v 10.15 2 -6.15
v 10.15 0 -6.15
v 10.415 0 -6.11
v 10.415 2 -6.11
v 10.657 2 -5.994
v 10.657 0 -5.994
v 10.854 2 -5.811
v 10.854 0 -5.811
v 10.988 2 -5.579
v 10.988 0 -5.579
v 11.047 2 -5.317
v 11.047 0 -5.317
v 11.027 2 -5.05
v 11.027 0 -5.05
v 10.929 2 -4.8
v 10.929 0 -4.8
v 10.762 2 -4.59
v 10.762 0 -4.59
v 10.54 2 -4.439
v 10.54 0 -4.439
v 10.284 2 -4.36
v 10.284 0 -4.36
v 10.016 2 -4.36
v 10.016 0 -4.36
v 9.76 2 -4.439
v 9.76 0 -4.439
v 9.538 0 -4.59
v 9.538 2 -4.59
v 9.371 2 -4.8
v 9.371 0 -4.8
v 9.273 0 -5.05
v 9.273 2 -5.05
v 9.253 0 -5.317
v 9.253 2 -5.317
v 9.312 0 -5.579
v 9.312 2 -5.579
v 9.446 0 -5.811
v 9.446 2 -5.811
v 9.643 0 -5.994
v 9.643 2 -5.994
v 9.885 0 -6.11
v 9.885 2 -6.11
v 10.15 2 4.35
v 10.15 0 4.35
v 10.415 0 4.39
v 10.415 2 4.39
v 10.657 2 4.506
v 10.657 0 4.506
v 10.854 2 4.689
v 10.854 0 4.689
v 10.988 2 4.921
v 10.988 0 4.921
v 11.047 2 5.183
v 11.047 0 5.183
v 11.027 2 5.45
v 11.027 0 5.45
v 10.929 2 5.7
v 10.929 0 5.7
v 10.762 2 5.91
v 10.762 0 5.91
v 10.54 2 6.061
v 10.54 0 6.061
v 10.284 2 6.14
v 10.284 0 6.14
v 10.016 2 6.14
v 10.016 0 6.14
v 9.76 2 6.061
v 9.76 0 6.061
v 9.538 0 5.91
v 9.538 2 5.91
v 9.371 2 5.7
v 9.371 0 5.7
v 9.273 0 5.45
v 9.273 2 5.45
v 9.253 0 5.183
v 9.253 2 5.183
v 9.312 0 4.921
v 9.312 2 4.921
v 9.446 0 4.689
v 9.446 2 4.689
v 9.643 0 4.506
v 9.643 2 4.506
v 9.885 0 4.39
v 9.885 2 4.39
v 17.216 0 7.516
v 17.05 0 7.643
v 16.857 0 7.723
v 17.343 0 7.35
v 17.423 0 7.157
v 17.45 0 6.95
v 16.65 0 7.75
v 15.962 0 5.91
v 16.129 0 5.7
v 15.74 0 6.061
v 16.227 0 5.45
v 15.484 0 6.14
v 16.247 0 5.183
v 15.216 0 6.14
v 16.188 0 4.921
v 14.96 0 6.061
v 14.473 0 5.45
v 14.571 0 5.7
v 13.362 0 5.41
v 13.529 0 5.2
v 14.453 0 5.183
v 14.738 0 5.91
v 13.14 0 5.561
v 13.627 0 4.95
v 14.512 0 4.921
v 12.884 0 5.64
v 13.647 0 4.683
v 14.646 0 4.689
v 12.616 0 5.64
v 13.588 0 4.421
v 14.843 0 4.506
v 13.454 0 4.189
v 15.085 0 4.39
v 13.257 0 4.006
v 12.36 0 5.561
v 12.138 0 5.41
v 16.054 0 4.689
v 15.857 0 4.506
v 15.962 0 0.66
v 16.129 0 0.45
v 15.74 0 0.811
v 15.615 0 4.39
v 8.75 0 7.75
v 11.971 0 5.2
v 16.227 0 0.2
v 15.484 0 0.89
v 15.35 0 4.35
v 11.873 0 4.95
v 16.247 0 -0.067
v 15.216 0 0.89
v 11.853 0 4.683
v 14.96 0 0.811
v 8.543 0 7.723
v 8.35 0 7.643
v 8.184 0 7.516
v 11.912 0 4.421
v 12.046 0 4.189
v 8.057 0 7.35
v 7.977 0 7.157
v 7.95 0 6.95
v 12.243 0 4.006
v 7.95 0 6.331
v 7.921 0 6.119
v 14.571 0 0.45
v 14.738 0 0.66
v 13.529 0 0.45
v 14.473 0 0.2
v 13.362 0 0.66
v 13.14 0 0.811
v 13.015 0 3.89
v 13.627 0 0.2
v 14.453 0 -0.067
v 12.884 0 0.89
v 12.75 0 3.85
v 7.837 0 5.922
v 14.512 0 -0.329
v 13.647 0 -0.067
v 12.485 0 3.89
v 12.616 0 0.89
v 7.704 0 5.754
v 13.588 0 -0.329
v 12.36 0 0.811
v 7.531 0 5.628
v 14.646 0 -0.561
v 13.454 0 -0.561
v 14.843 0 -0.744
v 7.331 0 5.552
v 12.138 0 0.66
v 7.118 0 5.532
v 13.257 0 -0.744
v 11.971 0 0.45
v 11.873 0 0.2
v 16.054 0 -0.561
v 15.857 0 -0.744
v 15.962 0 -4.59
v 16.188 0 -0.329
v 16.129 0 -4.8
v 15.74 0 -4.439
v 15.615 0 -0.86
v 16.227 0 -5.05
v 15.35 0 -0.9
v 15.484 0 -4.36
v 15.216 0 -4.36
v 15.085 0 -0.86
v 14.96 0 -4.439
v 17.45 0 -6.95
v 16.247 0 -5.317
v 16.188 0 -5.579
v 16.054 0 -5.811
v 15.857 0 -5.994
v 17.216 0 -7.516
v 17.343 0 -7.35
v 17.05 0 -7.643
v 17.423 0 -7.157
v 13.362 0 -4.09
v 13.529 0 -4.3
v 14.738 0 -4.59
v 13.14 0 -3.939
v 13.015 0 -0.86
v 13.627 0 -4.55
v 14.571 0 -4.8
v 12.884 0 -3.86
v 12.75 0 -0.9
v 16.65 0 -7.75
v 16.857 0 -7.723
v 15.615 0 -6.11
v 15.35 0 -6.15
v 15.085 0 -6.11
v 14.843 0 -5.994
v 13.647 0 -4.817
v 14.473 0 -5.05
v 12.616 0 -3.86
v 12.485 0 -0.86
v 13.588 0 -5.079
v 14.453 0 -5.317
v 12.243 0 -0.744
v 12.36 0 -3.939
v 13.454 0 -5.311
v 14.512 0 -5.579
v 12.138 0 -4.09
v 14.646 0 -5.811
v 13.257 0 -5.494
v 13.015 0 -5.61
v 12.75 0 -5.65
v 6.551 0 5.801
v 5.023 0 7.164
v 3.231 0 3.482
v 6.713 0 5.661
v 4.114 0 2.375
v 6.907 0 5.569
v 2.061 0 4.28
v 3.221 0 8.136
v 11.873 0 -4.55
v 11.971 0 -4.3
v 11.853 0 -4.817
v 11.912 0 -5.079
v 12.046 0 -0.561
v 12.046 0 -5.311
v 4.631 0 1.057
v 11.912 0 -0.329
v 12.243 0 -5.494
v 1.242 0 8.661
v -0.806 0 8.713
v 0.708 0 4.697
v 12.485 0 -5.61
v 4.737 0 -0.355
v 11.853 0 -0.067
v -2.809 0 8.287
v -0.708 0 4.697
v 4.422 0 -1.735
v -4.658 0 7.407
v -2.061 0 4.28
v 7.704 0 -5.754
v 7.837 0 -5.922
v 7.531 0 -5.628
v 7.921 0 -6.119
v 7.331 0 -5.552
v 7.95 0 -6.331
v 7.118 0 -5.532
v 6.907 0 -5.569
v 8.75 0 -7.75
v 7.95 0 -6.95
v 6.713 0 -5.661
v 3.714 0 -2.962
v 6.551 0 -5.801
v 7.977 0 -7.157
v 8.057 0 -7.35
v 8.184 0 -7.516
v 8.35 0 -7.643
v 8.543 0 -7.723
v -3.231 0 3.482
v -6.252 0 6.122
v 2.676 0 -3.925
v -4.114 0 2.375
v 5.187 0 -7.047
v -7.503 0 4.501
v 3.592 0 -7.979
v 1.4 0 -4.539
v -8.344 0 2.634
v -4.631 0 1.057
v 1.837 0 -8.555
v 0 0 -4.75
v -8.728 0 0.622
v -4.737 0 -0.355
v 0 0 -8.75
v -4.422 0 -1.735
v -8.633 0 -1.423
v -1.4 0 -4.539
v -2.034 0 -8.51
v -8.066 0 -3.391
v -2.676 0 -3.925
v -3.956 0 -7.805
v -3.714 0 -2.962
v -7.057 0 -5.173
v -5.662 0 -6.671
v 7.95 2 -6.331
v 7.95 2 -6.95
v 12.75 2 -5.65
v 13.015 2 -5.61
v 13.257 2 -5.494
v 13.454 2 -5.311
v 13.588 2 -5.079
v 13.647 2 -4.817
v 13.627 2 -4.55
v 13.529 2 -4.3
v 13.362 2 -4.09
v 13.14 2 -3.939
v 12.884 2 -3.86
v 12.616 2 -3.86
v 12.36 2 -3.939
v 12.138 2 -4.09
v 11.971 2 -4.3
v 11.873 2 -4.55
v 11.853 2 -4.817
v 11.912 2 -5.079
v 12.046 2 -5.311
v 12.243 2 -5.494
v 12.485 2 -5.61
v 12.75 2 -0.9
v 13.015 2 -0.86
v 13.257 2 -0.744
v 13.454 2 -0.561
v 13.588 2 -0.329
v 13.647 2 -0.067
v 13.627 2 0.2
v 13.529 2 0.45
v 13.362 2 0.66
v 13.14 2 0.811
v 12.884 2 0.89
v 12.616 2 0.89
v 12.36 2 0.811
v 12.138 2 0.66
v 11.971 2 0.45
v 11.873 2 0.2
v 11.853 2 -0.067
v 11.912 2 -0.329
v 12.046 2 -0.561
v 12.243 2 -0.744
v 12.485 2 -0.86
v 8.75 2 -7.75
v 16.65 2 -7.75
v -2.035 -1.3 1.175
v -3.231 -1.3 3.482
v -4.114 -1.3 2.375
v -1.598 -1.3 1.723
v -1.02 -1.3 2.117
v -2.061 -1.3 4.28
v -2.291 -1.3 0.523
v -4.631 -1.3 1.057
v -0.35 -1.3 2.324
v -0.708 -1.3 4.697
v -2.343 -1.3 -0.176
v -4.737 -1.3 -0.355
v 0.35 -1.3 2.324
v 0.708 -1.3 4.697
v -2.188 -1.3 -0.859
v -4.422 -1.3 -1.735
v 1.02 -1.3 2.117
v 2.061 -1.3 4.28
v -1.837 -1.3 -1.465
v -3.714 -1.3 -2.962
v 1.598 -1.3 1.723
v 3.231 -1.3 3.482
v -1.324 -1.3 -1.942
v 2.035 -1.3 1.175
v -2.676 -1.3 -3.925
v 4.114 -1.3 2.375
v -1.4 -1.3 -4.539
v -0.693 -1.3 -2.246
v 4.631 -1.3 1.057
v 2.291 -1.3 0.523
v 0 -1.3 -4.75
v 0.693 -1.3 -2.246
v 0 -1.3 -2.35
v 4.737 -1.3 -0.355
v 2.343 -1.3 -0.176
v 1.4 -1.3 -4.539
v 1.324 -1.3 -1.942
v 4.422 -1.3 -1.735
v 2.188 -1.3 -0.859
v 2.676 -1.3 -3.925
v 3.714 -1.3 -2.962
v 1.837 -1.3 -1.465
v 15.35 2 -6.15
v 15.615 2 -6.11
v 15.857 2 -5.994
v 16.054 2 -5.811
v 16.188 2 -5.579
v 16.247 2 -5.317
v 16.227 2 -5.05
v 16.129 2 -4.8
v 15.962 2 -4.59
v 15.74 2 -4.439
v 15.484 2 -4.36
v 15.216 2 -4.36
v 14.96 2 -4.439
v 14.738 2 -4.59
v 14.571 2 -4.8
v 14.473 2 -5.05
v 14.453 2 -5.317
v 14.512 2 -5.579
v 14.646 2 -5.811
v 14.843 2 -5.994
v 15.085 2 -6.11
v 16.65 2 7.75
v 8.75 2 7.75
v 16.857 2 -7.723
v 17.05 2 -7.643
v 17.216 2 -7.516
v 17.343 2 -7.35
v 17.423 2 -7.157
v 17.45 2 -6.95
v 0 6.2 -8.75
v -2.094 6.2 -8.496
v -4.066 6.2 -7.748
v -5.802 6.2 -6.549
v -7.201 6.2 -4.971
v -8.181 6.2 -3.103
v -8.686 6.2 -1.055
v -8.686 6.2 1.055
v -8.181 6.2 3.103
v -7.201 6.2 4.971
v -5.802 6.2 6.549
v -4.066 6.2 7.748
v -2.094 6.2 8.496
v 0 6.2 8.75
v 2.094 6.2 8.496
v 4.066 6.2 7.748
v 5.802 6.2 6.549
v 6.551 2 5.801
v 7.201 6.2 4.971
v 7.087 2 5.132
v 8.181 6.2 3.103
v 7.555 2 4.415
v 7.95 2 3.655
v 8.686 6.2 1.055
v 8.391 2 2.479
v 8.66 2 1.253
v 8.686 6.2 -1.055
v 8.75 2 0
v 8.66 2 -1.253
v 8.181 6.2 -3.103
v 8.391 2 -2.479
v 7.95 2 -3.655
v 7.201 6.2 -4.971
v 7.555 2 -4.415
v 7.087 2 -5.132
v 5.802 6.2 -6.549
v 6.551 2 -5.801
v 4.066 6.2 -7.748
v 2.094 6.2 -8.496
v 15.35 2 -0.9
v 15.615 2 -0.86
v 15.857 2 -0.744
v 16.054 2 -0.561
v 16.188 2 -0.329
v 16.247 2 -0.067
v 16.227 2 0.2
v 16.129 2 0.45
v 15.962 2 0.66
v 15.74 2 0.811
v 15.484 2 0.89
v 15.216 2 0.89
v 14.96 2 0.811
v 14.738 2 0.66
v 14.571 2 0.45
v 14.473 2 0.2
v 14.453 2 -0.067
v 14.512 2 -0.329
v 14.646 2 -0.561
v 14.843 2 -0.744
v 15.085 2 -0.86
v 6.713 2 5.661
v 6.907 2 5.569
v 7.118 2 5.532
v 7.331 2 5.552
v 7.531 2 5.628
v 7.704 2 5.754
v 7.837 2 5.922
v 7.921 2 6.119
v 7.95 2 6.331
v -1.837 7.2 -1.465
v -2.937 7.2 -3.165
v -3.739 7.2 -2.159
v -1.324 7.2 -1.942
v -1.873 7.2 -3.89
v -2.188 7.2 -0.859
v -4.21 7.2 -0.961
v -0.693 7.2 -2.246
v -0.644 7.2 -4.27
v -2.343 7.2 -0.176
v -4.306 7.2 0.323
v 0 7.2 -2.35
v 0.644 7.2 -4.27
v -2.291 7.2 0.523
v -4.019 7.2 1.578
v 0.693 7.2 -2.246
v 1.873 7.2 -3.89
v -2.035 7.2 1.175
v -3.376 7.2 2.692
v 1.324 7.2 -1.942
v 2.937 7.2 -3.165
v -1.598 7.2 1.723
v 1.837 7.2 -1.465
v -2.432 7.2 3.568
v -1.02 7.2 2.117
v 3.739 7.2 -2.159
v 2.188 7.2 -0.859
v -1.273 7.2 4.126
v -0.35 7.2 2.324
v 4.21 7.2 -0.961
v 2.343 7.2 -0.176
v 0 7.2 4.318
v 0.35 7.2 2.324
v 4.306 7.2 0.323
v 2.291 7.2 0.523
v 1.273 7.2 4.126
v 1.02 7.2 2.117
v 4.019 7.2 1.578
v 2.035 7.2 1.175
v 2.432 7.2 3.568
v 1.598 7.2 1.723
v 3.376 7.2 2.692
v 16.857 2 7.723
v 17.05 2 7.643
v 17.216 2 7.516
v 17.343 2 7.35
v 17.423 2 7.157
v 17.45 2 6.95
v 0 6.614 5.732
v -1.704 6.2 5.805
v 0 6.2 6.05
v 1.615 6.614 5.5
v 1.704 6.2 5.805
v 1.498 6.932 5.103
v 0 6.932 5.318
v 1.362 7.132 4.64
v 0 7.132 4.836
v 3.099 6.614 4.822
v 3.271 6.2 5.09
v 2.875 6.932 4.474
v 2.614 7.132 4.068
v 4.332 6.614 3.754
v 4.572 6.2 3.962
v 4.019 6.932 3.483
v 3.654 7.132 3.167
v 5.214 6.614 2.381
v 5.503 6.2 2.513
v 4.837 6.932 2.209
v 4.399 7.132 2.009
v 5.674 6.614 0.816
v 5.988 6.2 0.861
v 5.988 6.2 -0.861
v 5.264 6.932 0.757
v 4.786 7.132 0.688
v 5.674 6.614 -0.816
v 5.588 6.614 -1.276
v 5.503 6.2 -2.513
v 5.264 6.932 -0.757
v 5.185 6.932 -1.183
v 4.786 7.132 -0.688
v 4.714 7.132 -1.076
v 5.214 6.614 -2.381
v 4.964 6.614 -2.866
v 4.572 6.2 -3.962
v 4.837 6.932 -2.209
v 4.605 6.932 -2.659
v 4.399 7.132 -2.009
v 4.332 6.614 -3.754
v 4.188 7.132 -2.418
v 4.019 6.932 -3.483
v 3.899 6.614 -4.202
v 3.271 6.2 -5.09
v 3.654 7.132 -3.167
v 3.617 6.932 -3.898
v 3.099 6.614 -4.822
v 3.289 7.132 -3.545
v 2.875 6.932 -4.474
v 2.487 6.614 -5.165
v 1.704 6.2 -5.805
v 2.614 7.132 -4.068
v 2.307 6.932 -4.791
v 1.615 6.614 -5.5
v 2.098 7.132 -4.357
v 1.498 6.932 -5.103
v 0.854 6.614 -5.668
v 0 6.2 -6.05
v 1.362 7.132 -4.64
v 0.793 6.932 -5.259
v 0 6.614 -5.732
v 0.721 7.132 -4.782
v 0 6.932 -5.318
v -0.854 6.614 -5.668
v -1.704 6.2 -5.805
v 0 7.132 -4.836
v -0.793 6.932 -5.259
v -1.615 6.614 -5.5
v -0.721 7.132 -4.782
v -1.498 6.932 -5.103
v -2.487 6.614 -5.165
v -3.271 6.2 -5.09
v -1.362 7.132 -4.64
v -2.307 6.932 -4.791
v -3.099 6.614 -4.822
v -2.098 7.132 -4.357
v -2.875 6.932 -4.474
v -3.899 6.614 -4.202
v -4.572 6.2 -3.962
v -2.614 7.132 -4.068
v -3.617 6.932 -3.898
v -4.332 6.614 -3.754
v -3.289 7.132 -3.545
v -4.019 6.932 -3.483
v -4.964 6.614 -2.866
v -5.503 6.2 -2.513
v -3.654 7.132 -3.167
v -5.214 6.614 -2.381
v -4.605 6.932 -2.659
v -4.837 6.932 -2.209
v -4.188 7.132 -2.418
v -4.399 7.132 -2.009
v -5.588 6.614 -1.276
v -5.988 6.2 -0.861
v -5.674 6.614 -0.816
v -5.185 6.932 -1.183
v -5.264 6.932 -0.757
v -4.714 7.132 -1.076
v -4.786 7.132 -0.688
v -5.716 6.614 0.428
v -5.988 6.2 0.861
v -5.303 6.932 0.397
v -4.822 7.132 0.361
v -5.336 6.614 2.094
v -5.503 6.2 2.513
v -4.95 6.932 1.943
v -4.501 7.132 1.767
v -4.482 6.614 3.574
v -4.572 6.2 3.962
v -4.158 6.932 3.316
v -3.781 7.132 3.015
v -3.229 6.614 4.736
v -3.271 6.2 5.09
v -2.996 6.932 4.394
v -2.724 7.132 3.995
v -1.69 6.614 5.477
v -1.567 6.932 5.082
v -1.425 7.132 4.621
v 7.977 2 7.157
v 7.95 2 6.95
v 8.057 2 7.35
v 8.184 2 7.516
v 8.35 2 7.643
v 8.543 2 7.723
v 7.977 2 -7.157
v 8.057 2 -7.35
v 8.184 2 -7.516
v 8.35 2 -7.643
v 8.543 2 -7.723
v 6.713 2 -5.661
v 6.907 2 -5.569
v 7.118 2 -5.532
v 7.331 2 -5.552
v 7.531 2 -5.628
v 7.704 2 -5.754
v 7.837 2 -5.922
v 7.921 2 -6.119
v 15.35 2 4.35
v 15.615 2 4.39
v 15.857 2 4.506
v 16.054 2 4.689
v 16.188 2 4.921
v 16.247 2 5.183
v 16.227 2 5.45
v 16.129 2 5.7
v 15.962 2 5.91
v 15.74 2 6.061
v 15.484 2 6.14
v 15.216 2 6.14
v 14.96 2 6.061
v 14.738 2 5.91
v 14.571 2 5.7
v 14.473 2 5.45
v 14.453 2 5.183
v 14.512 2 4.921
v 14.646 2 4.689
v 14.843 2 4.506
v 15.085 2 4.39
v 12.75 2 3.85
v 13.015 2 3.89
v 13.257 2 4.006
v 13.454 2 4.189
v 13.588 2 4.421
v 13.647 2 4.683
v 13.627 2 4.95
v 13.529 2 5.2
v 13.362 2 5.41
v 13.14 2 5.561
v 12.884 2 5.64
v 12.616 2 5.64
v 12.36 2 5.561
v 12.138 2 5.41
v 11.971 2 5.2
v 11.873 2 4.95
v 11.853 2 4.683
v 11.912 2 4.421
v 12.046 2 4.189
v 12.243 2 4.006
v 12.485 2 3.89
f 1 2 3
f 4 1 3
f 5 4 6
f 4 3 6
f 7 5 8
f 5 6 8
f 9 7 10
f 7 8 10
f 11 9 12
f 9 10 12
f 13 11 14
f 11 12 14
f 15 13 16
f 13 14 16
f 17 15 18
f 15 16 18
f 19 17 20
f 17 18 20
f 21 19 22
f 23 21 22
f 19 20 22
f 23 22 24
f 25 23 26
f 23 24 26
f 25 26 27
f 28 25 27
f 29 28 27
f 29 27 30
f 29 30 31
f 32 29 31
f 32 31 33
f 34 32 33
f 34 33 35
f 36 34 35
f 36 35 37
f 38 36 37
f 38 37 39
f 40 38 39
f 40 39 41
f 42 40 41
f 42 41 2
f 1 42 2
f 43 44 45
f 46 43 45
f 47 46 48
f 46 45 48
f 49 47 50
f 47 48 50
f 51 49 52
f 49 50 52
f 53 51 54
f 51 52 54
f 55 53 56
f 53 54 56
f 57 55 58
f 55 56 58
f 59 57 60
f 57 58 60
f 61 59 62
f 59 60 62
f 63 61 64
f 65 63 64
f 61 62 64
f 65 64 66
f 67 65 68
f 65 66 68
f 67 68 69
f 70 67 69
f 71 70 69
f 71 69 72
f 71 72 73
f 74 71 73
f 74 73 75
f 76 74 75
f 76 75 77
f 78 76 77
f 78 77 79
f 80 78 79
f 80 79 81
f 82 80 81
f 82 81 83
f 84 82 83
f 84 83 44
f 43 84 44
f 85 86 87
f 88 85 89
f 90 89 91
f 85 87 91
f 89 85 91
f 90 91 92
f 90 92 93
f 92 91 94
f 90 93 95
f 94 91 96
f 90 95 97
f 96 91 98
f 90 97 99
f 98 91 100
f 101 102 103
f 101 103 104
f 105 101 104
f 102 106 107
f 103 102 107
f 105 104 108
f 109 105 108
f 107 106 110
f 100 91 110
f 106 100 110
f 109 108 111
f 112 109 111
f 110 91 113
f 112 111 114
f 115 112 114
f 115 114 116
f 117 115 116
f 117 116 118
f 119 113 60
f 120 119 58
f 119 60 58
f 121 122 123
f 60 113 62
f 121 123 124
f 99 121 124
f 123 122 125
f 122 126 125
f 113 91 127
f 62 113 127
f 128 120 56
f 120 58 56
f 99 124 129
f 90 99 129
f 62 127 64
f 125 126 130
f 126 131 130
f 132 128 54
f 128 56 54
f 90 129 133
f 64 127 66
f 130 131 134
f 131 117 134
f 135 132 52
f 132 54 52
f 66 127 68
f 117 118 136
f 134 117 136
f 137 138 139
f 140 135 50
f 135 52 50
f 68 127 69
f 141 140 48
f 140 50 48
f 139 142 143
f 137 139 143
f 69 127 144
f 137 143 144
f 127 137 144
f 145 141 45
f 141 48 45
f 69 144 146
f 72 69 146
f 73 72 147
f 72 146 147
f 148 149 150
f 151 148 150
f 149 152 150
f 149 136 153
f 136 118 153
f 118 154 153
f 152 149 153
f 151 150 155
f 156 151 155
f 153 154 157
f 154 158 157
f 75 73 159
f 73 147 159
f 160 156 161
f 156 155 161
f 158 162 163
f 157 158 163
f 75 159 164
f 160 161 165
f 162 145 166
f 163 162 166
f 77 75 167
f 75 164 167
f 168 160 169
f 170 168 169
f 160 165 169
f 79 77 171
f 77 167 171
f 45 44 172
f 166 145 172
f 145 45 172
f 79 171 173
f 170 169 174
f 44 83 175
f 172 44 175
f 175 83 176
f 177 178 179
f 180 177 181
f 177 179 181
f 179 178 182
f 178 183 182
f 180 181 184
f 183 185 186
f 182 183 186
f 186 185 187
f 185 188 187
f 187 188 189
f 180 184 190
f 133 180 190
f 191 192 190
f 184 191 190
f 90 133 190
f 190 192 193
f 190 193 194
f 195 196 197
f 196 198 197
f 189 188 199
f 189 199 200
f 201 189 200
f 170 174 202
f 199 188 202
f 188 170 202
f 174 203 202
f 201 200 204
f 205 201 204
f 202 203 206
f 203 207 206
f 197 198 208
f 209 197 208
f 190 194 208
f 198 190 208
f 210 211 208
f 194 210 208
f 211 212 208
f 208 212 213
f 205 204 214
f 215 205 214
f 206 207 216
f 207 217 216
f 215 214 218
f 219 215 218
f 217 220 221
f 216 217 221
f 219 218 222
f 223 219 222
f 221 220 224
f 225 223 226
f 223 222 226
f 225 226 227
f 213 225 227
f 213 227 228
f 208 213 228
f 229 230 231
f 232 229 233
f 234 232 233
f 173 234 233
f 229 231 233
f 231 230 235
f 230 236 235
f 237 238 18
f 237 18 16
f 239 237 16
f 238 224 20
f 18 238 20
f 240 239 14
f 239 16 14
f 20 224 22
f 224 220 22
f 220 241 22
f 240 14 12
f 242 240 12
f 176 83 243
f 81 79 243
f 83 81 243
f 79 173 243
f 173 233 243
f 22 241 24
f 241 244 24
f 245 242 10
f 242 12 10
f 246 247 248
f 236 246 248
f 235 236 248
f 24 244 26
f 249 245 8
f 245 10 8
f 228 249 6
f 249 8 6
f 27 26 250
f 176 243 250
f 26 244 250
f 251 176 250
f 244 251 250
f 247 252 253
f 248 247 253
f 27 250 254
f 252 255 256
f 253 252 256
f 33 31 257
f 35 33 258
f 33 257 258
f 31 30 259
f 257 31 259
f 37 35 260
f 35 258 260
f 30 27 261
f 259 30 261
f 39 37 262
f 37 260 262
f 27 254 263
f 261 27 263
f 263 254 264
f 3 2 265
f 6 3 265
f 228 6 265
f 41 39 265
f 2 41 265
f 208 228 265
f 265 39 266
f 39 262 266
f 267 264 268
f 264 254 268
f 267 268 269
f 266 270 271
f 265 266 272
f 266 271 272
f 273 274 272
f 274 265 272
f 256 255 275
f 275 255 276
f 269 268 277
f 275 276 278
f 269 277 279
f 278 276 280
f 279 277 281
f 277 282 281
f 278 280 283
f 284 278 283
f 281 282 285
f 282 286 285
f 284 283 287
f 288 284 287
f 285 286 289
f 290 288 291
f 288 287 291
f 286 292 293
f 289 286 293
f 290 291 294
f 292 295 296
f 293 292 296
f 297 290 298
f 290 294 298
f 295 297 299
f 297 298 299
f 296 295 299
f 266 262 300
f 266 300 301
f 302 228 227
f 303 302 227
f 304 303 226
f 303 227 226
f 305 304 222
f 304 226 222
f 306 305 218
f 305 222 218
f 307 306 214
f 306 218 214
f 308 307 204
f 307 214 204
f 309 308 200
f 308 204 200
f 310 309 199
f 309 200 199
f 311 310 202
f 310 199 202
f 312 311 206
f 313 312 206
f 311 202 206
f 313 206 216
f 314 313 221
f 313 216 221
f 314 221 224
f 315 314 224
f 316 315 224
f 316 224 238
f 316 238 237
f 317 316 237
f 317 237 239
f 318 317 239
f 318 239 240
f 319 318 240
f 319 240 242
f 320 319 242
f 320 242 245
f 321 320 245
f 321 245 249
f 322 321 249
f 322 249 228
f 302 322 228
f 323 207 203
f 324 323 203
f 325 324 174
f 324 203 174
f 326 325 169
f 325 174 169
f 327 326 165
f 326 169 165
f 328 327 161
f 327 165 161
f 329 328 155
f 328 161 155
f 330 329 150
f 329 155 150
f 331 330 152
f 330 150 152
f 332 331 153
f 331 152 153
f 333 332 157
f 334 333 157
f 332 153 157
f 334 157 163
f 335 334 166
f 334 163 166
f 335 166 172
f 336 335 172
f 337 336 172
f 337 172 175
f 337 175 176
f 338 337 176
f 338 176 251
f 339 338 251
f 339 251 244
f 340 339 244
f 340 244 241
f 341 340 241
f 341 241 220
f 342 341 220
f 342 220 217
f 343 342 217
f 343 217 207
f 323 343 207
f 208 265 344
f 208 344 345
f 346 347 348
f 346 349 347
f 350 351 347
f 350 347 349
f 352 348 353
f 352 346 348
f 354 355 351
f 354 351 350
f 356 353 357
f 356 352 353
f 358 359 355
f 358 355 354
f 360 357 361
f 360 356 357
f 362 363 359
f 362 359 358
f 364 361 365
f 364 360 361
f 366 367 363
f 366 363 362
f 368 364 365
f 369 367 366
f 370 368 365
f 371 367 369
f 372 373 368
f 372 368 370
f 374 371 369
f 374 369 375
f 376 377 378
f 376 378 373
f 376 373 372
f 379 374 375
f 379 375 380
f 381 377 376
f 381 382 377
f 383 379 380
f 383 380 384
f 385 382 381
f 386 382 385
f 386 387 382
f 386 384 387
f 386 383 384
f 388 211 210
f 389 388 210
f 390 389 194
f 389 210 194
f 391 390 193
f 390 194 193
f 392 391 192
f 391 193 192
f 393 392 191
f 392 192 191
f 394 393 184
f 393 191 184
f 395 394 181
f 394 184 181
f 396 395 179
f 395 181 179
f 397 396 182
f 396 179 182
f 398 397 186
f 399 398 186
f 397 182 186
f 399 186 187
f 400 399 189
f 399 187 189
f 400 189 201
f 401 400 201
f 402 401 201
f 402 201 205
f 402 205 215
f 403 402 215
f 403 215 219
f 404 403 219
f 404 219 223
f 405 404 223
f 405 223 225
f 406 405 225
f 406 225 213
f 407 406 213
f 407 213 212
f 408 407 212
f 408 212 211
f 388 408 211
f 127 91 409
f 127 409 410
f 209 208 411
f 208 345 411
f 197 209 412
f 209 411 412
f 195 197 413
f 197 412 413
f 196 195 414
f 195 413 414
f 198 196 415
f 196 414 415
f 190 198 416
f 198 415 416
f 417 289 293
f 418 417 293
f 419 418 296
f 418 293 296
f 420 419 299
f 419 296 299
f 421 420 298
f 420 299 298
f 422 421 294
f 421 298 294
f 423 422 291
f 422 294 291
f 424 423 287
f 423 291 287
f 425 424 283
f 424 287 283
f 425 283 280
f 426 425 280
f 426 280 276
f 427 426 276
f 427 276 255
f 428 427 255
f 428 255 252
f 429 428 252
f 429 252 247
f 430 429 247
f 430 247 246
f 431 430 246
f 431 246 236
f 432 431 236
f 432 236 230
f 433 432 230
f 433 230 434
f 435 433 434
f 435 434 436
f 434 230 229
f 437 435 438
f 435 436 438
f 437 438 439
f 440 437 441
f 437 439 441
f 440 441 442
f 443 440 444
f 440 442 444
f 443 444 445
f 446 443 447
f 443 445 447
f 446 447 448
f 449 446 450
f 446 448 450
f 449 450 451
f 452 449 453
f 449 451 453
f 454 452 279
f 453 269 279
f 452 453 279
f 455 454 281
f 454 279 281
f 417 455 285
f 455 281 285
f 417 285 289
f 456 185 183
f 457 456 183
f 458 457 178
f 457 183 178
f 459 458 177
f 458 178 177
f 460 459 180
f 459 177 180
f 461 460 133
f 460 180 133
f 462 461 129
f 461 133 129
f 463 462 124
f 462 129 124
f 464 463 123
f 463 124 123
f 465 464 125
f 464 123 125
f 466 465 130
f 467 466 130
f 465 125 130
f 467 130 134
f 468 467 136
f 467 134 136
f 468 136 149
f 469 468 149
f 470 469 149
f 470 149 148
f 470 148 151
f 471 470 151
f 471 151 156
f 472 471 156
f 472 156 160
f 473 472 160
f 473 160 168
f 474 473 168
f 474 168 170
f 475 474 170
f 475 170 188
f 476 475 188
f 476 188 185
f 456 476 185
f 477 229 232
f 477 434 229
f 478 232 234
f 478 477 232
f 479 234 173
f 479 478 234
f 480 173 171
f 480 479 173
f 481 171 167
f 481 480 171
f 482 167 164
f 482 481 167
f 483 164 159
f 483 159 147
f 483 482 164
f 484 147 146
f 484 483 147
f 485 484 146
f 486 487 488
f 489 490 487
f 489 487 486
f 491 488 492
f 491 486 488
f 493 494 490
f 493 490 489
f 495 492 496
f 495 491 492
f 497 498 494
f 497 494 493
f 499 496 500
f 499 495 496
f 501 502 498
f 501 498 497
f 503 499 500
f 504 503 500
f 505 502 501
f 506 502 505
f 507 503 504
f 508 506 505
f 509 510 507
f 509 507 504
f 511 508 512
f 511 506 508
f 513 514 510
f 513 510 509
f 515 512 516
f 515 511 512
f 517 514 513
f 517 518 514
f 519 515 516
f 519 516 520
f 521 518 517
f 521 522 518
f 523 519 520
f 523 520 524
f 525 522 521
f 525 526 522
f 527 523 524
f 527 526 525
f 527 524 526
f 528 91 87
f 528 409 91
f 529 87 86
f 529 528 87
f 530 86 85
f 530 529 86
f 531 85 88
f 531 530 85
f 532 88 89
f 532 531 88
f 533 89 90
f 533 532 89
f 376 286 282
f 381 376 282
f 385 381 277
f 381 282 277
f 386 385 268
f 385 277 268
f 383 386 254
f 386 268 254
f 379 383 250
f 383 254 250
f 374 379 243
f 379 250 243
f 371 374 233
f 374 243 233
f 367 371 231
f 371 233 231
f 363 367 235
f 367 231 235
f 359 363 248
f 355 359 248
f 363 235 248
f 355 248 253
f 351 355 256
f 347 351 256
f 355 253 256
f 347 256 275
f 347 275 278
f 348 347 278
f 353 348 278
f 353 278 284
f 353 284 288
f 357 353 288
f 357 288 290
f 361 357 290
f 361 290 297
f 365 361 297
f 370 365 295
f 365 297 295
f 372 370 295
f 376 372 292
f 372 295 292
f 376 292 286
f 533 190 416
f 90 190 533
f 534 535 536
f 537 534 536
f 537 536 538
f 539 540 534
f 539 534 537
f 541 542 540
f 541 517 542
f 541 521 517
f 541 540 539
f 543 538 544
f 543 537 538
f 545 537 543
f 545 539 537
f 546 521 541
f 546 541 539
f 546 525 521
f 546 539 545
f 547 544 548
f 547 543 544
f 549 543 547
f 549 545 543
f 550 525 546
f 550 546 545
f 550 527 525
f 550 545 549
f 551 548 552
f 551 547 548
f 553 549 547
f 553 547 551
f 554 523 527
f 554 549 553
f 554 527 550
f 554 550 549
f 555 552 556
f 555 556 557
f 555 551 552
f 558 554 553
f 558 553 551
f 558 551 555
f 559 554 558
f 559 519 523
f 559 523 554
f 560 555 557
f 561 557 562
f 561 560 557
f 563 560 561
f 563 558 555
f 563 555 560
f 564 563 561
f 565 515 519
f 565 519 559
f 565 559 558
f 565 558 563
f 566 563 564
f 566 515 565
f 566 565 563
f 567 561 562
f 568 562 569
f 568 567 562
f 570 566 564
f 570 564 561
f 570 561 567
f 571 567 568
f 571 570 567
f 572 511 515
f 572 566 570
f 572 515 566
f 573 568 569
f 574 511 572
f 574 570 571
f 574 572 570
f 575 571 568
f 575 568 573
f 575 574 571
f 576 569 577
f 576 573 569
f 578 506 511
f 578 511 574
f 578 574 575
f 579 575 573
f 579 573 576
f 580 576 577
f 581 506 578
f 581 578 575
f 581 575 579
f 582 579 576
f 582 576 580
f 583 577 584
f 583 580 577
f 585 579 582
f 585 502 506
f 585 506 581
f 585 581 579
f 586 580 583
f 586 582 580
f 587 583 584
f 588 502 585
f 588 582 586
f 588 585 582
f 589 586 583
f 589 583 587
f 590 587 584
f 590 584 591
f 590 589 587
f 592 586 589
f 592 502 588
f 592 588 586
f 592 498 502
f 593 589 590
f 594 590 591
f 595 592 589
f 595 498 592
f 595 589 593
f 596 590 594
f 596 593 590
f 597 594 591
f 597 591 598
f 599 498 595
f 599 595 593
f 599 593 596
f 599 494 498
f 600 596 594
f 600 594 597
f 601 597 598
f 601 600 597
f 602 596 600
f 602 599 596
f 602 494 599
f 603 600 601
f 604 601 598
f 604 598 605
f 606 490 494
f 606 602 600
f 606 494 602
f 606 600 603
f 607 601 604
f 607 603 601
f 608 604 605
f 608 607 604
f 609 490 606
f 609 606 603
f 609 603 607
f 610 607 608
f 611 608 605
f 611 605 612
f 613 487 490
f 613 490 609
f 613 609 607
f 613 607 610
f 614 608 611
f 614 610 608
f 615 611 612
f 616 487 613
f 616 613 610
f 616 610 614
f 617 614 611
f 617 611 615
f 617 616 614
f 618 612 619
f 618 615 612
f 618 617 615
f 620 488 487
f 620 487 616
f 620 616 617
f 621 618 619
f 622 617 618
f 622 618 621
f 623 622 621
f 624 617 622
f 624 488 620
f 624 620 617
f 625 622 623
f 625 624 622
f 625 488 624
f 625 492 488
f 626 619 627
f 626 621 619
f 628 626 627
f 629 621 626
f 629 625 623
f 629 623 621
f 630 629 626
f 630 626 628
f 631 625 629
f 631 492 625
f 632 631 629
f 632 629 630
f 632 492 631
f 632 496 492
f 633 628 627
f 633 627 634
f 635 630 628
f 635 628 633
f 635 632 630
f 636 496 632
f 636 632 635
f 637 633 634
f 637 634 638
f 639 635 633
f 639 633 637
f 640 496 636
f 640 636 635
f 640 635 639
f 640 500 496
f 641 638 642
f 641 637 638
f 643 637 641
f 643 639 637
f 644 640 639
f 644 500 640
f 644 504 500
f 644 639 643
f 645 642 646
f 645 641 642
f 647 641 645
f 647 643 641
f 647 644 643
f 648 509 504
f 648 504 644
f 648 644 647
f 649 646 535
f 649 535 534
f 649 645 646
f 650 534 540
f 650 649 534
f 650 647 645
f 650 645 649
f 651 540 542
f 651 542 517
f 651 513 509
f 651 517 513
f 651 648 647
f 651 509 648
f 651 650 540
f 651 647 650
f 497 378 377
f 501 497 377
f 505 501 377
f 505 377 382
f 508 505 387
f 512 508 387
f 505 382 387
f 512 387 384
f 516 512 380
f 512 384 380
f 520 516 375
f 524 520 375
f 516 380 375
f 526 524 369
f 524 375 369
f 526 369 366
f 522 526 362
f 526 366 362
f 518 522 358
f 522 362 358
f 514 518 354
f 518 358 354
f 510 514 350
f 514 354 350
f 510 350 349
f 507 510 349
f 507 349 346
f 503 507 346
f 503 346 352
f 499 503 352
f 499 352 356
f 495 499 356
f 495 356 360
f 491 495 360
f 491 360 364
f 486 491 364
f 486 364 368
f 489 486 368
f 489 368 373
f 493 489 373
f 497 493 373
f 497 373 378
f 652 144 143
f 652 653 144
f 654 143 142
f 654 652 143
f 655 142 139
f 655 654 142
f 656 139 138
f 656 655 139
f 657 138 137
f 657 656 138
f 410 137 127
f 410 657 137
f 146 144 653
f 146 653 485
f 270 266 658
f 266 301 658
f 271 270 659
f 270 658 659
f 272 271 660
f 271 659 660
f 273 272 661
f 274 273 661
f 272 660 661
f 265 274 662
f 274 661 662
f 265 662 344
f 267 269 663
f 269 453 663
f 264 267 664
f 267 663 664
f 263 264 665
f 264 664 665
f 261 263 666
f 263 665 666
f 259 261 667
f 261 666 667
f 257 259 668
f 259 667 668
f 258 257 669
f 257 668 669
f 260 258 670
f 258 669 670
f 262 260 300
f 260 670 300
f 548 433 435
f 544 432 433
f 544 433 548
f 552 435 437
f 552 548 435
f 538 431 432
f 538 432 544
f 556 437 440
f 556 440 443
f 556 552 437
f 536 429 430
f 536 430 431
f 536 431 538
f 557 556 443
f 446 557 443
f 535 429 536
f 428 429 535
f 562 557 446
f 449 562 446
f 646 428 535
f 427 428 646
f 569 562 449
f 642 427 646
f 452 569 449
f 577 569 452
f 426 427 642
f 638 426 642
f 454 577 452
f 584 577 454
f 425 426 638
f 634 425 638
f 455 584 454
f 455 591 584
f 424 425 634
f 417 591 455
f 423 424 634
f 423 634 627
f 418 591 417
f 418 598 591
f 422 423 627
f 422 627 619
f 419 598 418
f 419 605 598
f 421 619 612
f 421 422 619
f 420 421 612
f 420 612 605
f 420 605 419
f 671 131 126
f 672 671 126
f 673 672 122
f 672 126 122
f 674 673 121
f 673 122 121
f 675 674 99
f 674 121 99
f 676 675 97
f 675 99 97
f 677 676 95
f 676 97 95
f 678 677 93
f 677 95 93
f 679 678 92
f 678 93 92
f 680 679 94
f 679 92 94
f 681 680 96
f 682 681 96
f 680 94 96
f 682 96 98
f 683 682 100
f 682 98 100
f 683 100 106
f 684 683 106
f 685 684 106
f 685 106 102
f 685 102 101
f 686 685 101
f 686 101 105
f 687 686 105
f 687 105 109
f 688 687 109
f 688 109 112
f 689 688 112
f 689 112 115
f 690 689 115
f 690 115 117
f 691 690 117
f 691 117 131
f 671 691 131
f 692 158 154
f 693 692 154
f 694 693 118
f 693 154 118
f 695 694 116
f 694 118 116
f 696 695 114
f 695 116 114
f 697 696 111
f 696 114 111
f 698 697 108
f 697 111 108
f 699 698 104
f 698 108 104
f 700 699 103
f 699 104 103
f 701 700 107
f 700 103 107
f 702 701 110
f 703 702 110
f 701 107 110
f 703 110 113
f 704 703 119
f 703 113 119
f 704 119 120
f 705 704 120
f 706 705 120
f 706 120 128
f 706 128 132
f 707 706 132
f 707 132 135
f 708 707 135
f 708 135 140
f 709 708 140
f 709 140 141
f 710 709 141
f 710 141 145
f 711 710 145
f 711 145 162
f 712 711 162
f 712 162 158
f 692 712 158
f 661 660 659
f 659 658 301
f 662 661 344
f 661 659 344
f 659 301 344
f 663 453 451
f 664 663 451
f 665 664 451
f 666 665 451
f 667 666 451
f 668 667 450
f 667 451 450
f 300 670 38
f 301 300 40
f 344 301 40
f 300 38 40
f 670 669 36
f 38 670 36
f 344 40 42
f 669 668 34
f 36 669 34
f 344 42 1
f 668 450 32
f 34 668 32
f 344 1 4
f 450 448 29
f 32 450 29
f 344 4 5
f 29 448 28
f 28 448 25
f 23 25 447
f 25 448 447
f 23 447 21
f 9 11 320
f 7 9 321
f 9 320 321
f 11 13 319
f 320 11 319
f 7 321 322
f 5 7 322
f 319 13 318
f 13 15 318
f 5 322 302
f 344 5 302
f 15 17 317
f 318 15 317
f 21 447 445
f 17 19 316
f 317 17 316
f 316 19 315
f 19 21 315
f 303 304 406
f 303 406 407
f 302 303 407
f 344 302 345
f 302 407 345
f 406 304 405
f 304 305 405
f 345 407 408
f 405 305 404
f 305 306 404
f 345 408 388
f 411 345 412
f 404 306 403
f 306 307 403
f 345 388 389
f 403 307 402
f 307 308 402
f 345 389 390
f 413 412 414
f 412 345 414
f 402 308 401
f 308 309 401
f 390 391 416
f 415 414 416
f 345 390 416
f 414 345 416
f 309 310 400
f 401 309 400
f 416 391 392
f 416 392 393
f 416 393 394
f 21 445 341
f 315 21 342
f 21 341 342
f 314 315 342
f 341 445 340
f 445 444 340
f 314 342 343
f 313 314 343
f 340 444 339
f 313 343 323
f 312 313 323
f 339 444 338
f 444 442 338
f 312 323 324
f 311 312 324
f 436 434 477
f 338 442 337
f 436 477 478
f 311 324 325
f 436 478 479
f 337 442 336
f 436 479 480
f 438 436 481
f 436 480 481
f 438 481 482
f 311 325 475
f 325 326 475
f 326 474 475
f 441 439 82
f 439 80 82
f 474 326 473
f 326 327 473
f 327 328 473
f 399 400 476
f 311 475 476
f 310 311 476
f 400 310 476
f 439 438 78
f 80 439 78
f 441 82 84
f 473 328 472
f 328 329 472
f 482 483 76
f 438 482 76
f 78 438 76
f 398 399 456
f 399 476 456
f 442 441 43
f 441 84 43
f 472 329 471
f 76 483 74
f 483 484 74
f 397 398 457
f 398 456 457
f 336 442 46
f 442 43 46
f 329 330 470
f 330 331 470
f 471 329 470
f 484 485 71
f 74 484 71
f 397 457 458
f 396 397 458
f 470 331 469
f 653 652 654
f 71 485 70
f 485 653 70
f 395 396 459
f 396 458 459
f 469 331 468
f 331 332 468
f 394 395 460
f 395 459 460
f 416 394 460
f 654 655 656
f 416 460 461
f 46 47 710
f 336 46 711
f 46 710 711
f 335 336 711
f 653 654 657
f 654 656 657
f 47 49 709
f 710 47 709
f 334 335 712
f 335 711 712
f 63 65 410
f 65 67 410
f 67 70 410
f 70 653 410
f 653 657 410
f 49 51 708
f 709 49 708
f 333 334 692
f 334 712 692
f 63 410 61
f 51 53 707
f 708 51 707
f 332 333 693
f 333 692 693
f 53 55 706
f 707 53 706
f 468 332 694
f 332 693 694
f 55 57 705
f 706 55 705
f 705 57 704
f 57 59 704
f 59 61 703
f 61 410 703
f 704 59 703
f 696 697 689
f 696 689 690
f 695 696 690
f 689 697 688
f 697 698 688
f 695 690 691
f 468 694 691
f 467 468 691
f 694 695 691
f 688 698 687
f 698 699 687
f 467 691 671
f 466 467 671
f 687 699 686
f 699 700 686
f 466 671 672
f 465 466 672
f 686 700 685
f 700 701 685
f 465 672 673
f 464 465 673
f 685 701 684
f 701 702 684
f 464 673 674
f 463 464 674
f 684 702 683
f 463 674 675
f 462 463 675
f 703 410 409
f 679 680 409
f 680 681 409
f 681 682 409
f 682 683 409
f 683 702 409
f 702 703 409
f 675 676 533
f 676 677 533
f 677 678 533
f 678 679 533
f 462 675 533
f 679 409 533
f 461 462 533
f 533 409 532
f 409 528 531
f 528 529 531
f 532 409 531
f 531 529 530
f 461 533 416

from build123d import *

# Parameters (mm, degrees)
SKETCH1_R           = 8.75
BOSS_EXTRUDE1_DEPTH = 6.2
BOSS_EXTRUDE2_DEPTH = 2
FILLET1_R           = 0.8
SKETCH3_R           = 4.75
BOSS_EXTRUDE3_DEPTH = 1.3
SKETCH6_R           = 6.05
BOSS_EXTRUDE5_DEPTH = 1
SKETCH4_R           = 2.35
CUT_EXTRUDE2_DEPTH  = 22.291195363
FILLET2_R           = 2
SKETCH7_R           = 0.9
CUT_EXTRUDE4_DEPTH  = 10


with BuildPart() as part:
    # Sketch1 → Boss-Extrude1 (new body)
    with BuildSketch(Plane(origin=(0, 0, 0), x_dir=(1, 0, 0), z_dir=(0, 1, 0))):
        with Locations(Location((0, 0, 0), (0, 0, 90))):
            Circle(SKETCH1_R)
    extrude(amount=BOSS_EXTRUDE1_DEPTH)

    # Sketch2 → Boss-Extrude2 (add)
    with BuildSketch(Plane.XZ):
        with BuildLine():
            ThreePointArc((7.95, 3.655133376), (8.547660499, 1.870828693), (8.75, 0))
            Line((8.75, 0), (17.45, 0))
            Line((17.45, 0), (17.45, 7.75))
            Line((17.45, 7.75), (7.95, 7.75))
            Line((7.95, 7.75), (7.95, 3.655133376))
        make_face()
        with BuildLine():
            Line((17.45, 0), (8.75, 0))
            ThreePointArc((8.75, 0), (8.547660499, -1.870828693), (7.95, -3.655133376))
            Line((7.95, -3.655133376), (7.95, -7.75))
            Line((7.95, -7.75), (17.45, -7.75))
            Line((17.45, -7.75), (17.45, 0))
        make_face()
    extrude(amount=-BOSS_EXTRUDE2_DEPTH)

    # Fillet1
    fillet1_edges = [part.edges().sort_by_distance(p)[0] for p in [
        (7.95, 1, 3.655133376),
        (7.95, 1, 7.75),
        (17.45, 1, 7.75),
        (17.45, 1, -7.75),
        (7.95, 1, -7.75),
        (7.95, 1, -3.655133376),
    ]]
    fillet(fillet1_edges, radius=FILLET1_R)

    # Sketch3 → Boss-Extrude3 (add)
    with BuildSketch(Plane.XZ):
        with Locations(Location((0, 0, 0), (0, 0, 270))):
            Circle(SKETCH3_R)
    extrude(amount=BOSS_EXTRUDE3_DEPTH)

    # Sketch6 → Boss-Extrude5 (add)
    with BuildSketch(Plane(origin=(0, 6.2, 0), x_dir=(1, 0, 0), z_dir=(0, 1, 0))):
        with Locations(Location((0, 0, 0), (0, 0, 270))):
            Circle(SKETCH6_R)
    extrude(amount=BOSS_EXTRUDE5_DEPTH)

    # Sketch4 → Cut-Extrude2 (cut, through all)
    with BuildSketch(Plane.XZ.offset(1.3)):
        with Locations(Location((0, 0, 0), (0, 0, 270))):
            Circle(SKETCH4_R)
    extrude(amount=-CUT_EXTRUDE2_DEPTH, mode=Mode.SUBTRACT)

    # Fillet2
    # the kernel refuses this fillet: 2 mm, written as the material it takes off along each edge
    with BuildSketch(Plane(origin=(0, 7.2, 0), x_dir=(0, 0, 1), z_dir=(-1, 0, 0))) as fillet2_piece_1:
        with BuildLine():
            CenterArc((4.317949192, -2), FILLET2_R, 30, 60)
            Line((4.317949192, 0), (4.317949192, 0.04))
            Line((4.317949192, 0.04), (6.05, 0.04))
            Line((6.05, 0.04), (6.09, 0))
            ThreePointArc((6.09, 0), (6.09, -0.5), (6.084641016, -0.98))
            Line((6.084641016, -0.98), (6.05, -1))
        make_face()
    revolve(axis=Axis((0, 7.2, 0), (0, 1, 0)), mode=Mode.SUBTRACT)

    # Sketch7 → Cut-Extrude4 (cut)
    with BuildSketch(Plane.XZ):
        with Locations(Location((15.35, -5.25, 0), (0, 0, 270))):
            Circle(SKETCH7_R)
        with Locations(Location((10.15, -5.25, 0), (0, 0, 270))):
            Circle(SKETCH7_R)
        with Locations(Location((12.75, 4.75, 0), (0, 0, 270))):
            Circle(SKETCH7_R)
        with Locations(Location((12.75, 0, 0), (0, 0, 270))):
            Circle(SKETCH7_R)
        with Locations(Location((12.75, -4.75, 0), (0, 0, 270))):
            Circle(SKETCH7_R)
        with Locations(Location((15.35, 5.25, 0), (0, 0, 270))):
            Circle(SKETCH7_R)
        with Locations(Location((15.35, 0, 0), (0, 0, 270))):
            Circle(SKETCH7_R)
        with Locations(Location((10.15, 5.25, 0), (0, 0, 270))):
            Circle(SKETCH7_R)
    extrude(amount=-CUT_EXTRUDE4_DEPTH, mode=Mode.SUBTRACT)


solid = part.part
